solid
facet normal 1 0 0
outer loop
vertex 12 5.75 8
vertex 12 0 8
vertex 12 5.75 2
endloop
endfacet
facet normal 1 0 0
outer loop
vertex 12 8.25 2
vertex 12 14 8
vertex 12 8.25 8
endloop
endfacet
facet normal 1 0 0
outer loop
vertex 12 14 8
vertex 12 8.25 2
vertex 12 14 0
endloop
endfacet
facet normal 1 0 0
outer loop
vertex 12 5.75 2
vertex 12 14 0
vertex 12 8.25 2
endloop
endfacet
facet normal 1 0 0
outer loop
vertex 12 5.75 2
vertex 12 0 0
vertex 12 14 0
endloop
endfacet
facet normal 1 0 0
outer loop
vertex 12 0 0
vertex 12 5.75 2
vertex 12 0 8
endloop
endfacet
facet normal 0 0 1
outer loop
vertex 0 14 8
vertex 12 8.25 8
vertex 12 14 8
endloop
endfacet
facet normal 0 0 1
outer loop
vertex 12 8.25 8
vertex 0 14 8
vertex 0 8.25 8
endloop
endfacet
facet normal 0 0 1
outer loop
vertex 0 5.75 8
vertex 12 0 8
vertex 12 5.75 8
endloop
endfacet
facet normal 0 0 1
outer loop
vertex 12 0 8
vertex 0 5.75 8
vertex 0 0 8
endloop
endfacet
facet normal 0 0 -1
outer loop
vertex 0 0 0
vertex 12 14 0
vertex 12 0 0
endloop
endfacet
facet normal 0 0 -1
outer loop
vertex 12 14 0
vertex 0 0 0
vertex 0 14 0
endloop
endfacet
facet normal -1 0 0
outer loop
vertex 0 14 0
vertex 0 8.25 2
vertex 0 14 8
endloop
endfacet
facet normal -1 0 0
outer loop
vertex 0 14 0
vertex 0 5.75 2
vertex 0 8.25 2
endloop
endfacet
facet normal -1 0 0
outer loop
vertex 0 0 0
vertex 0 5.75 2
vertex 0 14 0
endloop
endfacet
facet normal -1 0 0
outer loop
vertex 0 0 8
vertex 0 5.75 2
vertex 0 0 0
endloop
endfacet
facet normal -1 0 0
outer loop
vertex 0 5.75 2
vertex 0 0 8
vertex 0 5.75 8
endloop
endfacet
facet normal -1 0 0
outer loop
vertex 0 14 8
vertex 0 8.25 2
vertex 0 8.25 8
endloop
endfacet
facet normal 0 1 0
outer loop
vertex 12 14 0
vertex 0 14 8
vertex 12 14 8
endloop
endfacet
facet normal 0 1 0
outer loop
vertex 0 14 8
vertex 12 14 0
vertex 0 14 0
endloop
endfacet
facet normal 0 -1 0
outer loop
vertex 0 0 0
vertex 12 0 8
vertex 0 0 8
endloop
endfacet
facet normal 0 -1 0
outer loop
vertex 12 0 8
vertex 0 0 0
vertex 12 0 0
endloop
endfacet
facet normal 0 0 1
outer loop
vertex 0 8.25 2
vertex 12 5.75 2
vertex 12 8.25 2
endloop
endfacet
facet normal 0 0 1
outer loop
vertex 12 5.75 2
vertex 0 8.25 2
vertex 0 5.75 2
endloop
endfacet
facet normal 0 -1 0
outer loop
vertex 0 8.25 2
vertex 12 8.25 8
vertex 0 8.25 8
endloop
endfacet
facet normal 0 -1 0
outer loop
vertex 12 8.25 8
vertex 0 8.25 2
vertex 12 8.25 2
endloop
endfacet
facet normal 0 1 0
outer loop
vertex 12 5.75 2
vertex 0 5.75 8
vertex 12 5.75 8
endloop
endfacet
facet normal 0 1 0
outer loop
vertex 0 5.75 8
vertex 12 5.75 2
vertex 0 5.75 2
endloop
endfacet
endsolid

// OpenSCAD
$fn = 32;

// ----------------------------------------------------------------------
// Micro clip: slotted block, 5-20 mm class
// ----------------------------------------------------------------------

// --- parameters (mm) ---
block_l = 12;             // block length, X
block_w = 14;             // block width, Y
block_h = 8;              // block height, Z
slot_w = 2.5;             // slot width
slot_d = 6;               // slot depth from the top

difference() {
  cube([block_l, block_w, block_h]);
  translate([-1, block_w / 2 - slot_w / 2, block_h - slot_d])
    cube([block_l + 2, slot_w, slot_d + 1]);
}
